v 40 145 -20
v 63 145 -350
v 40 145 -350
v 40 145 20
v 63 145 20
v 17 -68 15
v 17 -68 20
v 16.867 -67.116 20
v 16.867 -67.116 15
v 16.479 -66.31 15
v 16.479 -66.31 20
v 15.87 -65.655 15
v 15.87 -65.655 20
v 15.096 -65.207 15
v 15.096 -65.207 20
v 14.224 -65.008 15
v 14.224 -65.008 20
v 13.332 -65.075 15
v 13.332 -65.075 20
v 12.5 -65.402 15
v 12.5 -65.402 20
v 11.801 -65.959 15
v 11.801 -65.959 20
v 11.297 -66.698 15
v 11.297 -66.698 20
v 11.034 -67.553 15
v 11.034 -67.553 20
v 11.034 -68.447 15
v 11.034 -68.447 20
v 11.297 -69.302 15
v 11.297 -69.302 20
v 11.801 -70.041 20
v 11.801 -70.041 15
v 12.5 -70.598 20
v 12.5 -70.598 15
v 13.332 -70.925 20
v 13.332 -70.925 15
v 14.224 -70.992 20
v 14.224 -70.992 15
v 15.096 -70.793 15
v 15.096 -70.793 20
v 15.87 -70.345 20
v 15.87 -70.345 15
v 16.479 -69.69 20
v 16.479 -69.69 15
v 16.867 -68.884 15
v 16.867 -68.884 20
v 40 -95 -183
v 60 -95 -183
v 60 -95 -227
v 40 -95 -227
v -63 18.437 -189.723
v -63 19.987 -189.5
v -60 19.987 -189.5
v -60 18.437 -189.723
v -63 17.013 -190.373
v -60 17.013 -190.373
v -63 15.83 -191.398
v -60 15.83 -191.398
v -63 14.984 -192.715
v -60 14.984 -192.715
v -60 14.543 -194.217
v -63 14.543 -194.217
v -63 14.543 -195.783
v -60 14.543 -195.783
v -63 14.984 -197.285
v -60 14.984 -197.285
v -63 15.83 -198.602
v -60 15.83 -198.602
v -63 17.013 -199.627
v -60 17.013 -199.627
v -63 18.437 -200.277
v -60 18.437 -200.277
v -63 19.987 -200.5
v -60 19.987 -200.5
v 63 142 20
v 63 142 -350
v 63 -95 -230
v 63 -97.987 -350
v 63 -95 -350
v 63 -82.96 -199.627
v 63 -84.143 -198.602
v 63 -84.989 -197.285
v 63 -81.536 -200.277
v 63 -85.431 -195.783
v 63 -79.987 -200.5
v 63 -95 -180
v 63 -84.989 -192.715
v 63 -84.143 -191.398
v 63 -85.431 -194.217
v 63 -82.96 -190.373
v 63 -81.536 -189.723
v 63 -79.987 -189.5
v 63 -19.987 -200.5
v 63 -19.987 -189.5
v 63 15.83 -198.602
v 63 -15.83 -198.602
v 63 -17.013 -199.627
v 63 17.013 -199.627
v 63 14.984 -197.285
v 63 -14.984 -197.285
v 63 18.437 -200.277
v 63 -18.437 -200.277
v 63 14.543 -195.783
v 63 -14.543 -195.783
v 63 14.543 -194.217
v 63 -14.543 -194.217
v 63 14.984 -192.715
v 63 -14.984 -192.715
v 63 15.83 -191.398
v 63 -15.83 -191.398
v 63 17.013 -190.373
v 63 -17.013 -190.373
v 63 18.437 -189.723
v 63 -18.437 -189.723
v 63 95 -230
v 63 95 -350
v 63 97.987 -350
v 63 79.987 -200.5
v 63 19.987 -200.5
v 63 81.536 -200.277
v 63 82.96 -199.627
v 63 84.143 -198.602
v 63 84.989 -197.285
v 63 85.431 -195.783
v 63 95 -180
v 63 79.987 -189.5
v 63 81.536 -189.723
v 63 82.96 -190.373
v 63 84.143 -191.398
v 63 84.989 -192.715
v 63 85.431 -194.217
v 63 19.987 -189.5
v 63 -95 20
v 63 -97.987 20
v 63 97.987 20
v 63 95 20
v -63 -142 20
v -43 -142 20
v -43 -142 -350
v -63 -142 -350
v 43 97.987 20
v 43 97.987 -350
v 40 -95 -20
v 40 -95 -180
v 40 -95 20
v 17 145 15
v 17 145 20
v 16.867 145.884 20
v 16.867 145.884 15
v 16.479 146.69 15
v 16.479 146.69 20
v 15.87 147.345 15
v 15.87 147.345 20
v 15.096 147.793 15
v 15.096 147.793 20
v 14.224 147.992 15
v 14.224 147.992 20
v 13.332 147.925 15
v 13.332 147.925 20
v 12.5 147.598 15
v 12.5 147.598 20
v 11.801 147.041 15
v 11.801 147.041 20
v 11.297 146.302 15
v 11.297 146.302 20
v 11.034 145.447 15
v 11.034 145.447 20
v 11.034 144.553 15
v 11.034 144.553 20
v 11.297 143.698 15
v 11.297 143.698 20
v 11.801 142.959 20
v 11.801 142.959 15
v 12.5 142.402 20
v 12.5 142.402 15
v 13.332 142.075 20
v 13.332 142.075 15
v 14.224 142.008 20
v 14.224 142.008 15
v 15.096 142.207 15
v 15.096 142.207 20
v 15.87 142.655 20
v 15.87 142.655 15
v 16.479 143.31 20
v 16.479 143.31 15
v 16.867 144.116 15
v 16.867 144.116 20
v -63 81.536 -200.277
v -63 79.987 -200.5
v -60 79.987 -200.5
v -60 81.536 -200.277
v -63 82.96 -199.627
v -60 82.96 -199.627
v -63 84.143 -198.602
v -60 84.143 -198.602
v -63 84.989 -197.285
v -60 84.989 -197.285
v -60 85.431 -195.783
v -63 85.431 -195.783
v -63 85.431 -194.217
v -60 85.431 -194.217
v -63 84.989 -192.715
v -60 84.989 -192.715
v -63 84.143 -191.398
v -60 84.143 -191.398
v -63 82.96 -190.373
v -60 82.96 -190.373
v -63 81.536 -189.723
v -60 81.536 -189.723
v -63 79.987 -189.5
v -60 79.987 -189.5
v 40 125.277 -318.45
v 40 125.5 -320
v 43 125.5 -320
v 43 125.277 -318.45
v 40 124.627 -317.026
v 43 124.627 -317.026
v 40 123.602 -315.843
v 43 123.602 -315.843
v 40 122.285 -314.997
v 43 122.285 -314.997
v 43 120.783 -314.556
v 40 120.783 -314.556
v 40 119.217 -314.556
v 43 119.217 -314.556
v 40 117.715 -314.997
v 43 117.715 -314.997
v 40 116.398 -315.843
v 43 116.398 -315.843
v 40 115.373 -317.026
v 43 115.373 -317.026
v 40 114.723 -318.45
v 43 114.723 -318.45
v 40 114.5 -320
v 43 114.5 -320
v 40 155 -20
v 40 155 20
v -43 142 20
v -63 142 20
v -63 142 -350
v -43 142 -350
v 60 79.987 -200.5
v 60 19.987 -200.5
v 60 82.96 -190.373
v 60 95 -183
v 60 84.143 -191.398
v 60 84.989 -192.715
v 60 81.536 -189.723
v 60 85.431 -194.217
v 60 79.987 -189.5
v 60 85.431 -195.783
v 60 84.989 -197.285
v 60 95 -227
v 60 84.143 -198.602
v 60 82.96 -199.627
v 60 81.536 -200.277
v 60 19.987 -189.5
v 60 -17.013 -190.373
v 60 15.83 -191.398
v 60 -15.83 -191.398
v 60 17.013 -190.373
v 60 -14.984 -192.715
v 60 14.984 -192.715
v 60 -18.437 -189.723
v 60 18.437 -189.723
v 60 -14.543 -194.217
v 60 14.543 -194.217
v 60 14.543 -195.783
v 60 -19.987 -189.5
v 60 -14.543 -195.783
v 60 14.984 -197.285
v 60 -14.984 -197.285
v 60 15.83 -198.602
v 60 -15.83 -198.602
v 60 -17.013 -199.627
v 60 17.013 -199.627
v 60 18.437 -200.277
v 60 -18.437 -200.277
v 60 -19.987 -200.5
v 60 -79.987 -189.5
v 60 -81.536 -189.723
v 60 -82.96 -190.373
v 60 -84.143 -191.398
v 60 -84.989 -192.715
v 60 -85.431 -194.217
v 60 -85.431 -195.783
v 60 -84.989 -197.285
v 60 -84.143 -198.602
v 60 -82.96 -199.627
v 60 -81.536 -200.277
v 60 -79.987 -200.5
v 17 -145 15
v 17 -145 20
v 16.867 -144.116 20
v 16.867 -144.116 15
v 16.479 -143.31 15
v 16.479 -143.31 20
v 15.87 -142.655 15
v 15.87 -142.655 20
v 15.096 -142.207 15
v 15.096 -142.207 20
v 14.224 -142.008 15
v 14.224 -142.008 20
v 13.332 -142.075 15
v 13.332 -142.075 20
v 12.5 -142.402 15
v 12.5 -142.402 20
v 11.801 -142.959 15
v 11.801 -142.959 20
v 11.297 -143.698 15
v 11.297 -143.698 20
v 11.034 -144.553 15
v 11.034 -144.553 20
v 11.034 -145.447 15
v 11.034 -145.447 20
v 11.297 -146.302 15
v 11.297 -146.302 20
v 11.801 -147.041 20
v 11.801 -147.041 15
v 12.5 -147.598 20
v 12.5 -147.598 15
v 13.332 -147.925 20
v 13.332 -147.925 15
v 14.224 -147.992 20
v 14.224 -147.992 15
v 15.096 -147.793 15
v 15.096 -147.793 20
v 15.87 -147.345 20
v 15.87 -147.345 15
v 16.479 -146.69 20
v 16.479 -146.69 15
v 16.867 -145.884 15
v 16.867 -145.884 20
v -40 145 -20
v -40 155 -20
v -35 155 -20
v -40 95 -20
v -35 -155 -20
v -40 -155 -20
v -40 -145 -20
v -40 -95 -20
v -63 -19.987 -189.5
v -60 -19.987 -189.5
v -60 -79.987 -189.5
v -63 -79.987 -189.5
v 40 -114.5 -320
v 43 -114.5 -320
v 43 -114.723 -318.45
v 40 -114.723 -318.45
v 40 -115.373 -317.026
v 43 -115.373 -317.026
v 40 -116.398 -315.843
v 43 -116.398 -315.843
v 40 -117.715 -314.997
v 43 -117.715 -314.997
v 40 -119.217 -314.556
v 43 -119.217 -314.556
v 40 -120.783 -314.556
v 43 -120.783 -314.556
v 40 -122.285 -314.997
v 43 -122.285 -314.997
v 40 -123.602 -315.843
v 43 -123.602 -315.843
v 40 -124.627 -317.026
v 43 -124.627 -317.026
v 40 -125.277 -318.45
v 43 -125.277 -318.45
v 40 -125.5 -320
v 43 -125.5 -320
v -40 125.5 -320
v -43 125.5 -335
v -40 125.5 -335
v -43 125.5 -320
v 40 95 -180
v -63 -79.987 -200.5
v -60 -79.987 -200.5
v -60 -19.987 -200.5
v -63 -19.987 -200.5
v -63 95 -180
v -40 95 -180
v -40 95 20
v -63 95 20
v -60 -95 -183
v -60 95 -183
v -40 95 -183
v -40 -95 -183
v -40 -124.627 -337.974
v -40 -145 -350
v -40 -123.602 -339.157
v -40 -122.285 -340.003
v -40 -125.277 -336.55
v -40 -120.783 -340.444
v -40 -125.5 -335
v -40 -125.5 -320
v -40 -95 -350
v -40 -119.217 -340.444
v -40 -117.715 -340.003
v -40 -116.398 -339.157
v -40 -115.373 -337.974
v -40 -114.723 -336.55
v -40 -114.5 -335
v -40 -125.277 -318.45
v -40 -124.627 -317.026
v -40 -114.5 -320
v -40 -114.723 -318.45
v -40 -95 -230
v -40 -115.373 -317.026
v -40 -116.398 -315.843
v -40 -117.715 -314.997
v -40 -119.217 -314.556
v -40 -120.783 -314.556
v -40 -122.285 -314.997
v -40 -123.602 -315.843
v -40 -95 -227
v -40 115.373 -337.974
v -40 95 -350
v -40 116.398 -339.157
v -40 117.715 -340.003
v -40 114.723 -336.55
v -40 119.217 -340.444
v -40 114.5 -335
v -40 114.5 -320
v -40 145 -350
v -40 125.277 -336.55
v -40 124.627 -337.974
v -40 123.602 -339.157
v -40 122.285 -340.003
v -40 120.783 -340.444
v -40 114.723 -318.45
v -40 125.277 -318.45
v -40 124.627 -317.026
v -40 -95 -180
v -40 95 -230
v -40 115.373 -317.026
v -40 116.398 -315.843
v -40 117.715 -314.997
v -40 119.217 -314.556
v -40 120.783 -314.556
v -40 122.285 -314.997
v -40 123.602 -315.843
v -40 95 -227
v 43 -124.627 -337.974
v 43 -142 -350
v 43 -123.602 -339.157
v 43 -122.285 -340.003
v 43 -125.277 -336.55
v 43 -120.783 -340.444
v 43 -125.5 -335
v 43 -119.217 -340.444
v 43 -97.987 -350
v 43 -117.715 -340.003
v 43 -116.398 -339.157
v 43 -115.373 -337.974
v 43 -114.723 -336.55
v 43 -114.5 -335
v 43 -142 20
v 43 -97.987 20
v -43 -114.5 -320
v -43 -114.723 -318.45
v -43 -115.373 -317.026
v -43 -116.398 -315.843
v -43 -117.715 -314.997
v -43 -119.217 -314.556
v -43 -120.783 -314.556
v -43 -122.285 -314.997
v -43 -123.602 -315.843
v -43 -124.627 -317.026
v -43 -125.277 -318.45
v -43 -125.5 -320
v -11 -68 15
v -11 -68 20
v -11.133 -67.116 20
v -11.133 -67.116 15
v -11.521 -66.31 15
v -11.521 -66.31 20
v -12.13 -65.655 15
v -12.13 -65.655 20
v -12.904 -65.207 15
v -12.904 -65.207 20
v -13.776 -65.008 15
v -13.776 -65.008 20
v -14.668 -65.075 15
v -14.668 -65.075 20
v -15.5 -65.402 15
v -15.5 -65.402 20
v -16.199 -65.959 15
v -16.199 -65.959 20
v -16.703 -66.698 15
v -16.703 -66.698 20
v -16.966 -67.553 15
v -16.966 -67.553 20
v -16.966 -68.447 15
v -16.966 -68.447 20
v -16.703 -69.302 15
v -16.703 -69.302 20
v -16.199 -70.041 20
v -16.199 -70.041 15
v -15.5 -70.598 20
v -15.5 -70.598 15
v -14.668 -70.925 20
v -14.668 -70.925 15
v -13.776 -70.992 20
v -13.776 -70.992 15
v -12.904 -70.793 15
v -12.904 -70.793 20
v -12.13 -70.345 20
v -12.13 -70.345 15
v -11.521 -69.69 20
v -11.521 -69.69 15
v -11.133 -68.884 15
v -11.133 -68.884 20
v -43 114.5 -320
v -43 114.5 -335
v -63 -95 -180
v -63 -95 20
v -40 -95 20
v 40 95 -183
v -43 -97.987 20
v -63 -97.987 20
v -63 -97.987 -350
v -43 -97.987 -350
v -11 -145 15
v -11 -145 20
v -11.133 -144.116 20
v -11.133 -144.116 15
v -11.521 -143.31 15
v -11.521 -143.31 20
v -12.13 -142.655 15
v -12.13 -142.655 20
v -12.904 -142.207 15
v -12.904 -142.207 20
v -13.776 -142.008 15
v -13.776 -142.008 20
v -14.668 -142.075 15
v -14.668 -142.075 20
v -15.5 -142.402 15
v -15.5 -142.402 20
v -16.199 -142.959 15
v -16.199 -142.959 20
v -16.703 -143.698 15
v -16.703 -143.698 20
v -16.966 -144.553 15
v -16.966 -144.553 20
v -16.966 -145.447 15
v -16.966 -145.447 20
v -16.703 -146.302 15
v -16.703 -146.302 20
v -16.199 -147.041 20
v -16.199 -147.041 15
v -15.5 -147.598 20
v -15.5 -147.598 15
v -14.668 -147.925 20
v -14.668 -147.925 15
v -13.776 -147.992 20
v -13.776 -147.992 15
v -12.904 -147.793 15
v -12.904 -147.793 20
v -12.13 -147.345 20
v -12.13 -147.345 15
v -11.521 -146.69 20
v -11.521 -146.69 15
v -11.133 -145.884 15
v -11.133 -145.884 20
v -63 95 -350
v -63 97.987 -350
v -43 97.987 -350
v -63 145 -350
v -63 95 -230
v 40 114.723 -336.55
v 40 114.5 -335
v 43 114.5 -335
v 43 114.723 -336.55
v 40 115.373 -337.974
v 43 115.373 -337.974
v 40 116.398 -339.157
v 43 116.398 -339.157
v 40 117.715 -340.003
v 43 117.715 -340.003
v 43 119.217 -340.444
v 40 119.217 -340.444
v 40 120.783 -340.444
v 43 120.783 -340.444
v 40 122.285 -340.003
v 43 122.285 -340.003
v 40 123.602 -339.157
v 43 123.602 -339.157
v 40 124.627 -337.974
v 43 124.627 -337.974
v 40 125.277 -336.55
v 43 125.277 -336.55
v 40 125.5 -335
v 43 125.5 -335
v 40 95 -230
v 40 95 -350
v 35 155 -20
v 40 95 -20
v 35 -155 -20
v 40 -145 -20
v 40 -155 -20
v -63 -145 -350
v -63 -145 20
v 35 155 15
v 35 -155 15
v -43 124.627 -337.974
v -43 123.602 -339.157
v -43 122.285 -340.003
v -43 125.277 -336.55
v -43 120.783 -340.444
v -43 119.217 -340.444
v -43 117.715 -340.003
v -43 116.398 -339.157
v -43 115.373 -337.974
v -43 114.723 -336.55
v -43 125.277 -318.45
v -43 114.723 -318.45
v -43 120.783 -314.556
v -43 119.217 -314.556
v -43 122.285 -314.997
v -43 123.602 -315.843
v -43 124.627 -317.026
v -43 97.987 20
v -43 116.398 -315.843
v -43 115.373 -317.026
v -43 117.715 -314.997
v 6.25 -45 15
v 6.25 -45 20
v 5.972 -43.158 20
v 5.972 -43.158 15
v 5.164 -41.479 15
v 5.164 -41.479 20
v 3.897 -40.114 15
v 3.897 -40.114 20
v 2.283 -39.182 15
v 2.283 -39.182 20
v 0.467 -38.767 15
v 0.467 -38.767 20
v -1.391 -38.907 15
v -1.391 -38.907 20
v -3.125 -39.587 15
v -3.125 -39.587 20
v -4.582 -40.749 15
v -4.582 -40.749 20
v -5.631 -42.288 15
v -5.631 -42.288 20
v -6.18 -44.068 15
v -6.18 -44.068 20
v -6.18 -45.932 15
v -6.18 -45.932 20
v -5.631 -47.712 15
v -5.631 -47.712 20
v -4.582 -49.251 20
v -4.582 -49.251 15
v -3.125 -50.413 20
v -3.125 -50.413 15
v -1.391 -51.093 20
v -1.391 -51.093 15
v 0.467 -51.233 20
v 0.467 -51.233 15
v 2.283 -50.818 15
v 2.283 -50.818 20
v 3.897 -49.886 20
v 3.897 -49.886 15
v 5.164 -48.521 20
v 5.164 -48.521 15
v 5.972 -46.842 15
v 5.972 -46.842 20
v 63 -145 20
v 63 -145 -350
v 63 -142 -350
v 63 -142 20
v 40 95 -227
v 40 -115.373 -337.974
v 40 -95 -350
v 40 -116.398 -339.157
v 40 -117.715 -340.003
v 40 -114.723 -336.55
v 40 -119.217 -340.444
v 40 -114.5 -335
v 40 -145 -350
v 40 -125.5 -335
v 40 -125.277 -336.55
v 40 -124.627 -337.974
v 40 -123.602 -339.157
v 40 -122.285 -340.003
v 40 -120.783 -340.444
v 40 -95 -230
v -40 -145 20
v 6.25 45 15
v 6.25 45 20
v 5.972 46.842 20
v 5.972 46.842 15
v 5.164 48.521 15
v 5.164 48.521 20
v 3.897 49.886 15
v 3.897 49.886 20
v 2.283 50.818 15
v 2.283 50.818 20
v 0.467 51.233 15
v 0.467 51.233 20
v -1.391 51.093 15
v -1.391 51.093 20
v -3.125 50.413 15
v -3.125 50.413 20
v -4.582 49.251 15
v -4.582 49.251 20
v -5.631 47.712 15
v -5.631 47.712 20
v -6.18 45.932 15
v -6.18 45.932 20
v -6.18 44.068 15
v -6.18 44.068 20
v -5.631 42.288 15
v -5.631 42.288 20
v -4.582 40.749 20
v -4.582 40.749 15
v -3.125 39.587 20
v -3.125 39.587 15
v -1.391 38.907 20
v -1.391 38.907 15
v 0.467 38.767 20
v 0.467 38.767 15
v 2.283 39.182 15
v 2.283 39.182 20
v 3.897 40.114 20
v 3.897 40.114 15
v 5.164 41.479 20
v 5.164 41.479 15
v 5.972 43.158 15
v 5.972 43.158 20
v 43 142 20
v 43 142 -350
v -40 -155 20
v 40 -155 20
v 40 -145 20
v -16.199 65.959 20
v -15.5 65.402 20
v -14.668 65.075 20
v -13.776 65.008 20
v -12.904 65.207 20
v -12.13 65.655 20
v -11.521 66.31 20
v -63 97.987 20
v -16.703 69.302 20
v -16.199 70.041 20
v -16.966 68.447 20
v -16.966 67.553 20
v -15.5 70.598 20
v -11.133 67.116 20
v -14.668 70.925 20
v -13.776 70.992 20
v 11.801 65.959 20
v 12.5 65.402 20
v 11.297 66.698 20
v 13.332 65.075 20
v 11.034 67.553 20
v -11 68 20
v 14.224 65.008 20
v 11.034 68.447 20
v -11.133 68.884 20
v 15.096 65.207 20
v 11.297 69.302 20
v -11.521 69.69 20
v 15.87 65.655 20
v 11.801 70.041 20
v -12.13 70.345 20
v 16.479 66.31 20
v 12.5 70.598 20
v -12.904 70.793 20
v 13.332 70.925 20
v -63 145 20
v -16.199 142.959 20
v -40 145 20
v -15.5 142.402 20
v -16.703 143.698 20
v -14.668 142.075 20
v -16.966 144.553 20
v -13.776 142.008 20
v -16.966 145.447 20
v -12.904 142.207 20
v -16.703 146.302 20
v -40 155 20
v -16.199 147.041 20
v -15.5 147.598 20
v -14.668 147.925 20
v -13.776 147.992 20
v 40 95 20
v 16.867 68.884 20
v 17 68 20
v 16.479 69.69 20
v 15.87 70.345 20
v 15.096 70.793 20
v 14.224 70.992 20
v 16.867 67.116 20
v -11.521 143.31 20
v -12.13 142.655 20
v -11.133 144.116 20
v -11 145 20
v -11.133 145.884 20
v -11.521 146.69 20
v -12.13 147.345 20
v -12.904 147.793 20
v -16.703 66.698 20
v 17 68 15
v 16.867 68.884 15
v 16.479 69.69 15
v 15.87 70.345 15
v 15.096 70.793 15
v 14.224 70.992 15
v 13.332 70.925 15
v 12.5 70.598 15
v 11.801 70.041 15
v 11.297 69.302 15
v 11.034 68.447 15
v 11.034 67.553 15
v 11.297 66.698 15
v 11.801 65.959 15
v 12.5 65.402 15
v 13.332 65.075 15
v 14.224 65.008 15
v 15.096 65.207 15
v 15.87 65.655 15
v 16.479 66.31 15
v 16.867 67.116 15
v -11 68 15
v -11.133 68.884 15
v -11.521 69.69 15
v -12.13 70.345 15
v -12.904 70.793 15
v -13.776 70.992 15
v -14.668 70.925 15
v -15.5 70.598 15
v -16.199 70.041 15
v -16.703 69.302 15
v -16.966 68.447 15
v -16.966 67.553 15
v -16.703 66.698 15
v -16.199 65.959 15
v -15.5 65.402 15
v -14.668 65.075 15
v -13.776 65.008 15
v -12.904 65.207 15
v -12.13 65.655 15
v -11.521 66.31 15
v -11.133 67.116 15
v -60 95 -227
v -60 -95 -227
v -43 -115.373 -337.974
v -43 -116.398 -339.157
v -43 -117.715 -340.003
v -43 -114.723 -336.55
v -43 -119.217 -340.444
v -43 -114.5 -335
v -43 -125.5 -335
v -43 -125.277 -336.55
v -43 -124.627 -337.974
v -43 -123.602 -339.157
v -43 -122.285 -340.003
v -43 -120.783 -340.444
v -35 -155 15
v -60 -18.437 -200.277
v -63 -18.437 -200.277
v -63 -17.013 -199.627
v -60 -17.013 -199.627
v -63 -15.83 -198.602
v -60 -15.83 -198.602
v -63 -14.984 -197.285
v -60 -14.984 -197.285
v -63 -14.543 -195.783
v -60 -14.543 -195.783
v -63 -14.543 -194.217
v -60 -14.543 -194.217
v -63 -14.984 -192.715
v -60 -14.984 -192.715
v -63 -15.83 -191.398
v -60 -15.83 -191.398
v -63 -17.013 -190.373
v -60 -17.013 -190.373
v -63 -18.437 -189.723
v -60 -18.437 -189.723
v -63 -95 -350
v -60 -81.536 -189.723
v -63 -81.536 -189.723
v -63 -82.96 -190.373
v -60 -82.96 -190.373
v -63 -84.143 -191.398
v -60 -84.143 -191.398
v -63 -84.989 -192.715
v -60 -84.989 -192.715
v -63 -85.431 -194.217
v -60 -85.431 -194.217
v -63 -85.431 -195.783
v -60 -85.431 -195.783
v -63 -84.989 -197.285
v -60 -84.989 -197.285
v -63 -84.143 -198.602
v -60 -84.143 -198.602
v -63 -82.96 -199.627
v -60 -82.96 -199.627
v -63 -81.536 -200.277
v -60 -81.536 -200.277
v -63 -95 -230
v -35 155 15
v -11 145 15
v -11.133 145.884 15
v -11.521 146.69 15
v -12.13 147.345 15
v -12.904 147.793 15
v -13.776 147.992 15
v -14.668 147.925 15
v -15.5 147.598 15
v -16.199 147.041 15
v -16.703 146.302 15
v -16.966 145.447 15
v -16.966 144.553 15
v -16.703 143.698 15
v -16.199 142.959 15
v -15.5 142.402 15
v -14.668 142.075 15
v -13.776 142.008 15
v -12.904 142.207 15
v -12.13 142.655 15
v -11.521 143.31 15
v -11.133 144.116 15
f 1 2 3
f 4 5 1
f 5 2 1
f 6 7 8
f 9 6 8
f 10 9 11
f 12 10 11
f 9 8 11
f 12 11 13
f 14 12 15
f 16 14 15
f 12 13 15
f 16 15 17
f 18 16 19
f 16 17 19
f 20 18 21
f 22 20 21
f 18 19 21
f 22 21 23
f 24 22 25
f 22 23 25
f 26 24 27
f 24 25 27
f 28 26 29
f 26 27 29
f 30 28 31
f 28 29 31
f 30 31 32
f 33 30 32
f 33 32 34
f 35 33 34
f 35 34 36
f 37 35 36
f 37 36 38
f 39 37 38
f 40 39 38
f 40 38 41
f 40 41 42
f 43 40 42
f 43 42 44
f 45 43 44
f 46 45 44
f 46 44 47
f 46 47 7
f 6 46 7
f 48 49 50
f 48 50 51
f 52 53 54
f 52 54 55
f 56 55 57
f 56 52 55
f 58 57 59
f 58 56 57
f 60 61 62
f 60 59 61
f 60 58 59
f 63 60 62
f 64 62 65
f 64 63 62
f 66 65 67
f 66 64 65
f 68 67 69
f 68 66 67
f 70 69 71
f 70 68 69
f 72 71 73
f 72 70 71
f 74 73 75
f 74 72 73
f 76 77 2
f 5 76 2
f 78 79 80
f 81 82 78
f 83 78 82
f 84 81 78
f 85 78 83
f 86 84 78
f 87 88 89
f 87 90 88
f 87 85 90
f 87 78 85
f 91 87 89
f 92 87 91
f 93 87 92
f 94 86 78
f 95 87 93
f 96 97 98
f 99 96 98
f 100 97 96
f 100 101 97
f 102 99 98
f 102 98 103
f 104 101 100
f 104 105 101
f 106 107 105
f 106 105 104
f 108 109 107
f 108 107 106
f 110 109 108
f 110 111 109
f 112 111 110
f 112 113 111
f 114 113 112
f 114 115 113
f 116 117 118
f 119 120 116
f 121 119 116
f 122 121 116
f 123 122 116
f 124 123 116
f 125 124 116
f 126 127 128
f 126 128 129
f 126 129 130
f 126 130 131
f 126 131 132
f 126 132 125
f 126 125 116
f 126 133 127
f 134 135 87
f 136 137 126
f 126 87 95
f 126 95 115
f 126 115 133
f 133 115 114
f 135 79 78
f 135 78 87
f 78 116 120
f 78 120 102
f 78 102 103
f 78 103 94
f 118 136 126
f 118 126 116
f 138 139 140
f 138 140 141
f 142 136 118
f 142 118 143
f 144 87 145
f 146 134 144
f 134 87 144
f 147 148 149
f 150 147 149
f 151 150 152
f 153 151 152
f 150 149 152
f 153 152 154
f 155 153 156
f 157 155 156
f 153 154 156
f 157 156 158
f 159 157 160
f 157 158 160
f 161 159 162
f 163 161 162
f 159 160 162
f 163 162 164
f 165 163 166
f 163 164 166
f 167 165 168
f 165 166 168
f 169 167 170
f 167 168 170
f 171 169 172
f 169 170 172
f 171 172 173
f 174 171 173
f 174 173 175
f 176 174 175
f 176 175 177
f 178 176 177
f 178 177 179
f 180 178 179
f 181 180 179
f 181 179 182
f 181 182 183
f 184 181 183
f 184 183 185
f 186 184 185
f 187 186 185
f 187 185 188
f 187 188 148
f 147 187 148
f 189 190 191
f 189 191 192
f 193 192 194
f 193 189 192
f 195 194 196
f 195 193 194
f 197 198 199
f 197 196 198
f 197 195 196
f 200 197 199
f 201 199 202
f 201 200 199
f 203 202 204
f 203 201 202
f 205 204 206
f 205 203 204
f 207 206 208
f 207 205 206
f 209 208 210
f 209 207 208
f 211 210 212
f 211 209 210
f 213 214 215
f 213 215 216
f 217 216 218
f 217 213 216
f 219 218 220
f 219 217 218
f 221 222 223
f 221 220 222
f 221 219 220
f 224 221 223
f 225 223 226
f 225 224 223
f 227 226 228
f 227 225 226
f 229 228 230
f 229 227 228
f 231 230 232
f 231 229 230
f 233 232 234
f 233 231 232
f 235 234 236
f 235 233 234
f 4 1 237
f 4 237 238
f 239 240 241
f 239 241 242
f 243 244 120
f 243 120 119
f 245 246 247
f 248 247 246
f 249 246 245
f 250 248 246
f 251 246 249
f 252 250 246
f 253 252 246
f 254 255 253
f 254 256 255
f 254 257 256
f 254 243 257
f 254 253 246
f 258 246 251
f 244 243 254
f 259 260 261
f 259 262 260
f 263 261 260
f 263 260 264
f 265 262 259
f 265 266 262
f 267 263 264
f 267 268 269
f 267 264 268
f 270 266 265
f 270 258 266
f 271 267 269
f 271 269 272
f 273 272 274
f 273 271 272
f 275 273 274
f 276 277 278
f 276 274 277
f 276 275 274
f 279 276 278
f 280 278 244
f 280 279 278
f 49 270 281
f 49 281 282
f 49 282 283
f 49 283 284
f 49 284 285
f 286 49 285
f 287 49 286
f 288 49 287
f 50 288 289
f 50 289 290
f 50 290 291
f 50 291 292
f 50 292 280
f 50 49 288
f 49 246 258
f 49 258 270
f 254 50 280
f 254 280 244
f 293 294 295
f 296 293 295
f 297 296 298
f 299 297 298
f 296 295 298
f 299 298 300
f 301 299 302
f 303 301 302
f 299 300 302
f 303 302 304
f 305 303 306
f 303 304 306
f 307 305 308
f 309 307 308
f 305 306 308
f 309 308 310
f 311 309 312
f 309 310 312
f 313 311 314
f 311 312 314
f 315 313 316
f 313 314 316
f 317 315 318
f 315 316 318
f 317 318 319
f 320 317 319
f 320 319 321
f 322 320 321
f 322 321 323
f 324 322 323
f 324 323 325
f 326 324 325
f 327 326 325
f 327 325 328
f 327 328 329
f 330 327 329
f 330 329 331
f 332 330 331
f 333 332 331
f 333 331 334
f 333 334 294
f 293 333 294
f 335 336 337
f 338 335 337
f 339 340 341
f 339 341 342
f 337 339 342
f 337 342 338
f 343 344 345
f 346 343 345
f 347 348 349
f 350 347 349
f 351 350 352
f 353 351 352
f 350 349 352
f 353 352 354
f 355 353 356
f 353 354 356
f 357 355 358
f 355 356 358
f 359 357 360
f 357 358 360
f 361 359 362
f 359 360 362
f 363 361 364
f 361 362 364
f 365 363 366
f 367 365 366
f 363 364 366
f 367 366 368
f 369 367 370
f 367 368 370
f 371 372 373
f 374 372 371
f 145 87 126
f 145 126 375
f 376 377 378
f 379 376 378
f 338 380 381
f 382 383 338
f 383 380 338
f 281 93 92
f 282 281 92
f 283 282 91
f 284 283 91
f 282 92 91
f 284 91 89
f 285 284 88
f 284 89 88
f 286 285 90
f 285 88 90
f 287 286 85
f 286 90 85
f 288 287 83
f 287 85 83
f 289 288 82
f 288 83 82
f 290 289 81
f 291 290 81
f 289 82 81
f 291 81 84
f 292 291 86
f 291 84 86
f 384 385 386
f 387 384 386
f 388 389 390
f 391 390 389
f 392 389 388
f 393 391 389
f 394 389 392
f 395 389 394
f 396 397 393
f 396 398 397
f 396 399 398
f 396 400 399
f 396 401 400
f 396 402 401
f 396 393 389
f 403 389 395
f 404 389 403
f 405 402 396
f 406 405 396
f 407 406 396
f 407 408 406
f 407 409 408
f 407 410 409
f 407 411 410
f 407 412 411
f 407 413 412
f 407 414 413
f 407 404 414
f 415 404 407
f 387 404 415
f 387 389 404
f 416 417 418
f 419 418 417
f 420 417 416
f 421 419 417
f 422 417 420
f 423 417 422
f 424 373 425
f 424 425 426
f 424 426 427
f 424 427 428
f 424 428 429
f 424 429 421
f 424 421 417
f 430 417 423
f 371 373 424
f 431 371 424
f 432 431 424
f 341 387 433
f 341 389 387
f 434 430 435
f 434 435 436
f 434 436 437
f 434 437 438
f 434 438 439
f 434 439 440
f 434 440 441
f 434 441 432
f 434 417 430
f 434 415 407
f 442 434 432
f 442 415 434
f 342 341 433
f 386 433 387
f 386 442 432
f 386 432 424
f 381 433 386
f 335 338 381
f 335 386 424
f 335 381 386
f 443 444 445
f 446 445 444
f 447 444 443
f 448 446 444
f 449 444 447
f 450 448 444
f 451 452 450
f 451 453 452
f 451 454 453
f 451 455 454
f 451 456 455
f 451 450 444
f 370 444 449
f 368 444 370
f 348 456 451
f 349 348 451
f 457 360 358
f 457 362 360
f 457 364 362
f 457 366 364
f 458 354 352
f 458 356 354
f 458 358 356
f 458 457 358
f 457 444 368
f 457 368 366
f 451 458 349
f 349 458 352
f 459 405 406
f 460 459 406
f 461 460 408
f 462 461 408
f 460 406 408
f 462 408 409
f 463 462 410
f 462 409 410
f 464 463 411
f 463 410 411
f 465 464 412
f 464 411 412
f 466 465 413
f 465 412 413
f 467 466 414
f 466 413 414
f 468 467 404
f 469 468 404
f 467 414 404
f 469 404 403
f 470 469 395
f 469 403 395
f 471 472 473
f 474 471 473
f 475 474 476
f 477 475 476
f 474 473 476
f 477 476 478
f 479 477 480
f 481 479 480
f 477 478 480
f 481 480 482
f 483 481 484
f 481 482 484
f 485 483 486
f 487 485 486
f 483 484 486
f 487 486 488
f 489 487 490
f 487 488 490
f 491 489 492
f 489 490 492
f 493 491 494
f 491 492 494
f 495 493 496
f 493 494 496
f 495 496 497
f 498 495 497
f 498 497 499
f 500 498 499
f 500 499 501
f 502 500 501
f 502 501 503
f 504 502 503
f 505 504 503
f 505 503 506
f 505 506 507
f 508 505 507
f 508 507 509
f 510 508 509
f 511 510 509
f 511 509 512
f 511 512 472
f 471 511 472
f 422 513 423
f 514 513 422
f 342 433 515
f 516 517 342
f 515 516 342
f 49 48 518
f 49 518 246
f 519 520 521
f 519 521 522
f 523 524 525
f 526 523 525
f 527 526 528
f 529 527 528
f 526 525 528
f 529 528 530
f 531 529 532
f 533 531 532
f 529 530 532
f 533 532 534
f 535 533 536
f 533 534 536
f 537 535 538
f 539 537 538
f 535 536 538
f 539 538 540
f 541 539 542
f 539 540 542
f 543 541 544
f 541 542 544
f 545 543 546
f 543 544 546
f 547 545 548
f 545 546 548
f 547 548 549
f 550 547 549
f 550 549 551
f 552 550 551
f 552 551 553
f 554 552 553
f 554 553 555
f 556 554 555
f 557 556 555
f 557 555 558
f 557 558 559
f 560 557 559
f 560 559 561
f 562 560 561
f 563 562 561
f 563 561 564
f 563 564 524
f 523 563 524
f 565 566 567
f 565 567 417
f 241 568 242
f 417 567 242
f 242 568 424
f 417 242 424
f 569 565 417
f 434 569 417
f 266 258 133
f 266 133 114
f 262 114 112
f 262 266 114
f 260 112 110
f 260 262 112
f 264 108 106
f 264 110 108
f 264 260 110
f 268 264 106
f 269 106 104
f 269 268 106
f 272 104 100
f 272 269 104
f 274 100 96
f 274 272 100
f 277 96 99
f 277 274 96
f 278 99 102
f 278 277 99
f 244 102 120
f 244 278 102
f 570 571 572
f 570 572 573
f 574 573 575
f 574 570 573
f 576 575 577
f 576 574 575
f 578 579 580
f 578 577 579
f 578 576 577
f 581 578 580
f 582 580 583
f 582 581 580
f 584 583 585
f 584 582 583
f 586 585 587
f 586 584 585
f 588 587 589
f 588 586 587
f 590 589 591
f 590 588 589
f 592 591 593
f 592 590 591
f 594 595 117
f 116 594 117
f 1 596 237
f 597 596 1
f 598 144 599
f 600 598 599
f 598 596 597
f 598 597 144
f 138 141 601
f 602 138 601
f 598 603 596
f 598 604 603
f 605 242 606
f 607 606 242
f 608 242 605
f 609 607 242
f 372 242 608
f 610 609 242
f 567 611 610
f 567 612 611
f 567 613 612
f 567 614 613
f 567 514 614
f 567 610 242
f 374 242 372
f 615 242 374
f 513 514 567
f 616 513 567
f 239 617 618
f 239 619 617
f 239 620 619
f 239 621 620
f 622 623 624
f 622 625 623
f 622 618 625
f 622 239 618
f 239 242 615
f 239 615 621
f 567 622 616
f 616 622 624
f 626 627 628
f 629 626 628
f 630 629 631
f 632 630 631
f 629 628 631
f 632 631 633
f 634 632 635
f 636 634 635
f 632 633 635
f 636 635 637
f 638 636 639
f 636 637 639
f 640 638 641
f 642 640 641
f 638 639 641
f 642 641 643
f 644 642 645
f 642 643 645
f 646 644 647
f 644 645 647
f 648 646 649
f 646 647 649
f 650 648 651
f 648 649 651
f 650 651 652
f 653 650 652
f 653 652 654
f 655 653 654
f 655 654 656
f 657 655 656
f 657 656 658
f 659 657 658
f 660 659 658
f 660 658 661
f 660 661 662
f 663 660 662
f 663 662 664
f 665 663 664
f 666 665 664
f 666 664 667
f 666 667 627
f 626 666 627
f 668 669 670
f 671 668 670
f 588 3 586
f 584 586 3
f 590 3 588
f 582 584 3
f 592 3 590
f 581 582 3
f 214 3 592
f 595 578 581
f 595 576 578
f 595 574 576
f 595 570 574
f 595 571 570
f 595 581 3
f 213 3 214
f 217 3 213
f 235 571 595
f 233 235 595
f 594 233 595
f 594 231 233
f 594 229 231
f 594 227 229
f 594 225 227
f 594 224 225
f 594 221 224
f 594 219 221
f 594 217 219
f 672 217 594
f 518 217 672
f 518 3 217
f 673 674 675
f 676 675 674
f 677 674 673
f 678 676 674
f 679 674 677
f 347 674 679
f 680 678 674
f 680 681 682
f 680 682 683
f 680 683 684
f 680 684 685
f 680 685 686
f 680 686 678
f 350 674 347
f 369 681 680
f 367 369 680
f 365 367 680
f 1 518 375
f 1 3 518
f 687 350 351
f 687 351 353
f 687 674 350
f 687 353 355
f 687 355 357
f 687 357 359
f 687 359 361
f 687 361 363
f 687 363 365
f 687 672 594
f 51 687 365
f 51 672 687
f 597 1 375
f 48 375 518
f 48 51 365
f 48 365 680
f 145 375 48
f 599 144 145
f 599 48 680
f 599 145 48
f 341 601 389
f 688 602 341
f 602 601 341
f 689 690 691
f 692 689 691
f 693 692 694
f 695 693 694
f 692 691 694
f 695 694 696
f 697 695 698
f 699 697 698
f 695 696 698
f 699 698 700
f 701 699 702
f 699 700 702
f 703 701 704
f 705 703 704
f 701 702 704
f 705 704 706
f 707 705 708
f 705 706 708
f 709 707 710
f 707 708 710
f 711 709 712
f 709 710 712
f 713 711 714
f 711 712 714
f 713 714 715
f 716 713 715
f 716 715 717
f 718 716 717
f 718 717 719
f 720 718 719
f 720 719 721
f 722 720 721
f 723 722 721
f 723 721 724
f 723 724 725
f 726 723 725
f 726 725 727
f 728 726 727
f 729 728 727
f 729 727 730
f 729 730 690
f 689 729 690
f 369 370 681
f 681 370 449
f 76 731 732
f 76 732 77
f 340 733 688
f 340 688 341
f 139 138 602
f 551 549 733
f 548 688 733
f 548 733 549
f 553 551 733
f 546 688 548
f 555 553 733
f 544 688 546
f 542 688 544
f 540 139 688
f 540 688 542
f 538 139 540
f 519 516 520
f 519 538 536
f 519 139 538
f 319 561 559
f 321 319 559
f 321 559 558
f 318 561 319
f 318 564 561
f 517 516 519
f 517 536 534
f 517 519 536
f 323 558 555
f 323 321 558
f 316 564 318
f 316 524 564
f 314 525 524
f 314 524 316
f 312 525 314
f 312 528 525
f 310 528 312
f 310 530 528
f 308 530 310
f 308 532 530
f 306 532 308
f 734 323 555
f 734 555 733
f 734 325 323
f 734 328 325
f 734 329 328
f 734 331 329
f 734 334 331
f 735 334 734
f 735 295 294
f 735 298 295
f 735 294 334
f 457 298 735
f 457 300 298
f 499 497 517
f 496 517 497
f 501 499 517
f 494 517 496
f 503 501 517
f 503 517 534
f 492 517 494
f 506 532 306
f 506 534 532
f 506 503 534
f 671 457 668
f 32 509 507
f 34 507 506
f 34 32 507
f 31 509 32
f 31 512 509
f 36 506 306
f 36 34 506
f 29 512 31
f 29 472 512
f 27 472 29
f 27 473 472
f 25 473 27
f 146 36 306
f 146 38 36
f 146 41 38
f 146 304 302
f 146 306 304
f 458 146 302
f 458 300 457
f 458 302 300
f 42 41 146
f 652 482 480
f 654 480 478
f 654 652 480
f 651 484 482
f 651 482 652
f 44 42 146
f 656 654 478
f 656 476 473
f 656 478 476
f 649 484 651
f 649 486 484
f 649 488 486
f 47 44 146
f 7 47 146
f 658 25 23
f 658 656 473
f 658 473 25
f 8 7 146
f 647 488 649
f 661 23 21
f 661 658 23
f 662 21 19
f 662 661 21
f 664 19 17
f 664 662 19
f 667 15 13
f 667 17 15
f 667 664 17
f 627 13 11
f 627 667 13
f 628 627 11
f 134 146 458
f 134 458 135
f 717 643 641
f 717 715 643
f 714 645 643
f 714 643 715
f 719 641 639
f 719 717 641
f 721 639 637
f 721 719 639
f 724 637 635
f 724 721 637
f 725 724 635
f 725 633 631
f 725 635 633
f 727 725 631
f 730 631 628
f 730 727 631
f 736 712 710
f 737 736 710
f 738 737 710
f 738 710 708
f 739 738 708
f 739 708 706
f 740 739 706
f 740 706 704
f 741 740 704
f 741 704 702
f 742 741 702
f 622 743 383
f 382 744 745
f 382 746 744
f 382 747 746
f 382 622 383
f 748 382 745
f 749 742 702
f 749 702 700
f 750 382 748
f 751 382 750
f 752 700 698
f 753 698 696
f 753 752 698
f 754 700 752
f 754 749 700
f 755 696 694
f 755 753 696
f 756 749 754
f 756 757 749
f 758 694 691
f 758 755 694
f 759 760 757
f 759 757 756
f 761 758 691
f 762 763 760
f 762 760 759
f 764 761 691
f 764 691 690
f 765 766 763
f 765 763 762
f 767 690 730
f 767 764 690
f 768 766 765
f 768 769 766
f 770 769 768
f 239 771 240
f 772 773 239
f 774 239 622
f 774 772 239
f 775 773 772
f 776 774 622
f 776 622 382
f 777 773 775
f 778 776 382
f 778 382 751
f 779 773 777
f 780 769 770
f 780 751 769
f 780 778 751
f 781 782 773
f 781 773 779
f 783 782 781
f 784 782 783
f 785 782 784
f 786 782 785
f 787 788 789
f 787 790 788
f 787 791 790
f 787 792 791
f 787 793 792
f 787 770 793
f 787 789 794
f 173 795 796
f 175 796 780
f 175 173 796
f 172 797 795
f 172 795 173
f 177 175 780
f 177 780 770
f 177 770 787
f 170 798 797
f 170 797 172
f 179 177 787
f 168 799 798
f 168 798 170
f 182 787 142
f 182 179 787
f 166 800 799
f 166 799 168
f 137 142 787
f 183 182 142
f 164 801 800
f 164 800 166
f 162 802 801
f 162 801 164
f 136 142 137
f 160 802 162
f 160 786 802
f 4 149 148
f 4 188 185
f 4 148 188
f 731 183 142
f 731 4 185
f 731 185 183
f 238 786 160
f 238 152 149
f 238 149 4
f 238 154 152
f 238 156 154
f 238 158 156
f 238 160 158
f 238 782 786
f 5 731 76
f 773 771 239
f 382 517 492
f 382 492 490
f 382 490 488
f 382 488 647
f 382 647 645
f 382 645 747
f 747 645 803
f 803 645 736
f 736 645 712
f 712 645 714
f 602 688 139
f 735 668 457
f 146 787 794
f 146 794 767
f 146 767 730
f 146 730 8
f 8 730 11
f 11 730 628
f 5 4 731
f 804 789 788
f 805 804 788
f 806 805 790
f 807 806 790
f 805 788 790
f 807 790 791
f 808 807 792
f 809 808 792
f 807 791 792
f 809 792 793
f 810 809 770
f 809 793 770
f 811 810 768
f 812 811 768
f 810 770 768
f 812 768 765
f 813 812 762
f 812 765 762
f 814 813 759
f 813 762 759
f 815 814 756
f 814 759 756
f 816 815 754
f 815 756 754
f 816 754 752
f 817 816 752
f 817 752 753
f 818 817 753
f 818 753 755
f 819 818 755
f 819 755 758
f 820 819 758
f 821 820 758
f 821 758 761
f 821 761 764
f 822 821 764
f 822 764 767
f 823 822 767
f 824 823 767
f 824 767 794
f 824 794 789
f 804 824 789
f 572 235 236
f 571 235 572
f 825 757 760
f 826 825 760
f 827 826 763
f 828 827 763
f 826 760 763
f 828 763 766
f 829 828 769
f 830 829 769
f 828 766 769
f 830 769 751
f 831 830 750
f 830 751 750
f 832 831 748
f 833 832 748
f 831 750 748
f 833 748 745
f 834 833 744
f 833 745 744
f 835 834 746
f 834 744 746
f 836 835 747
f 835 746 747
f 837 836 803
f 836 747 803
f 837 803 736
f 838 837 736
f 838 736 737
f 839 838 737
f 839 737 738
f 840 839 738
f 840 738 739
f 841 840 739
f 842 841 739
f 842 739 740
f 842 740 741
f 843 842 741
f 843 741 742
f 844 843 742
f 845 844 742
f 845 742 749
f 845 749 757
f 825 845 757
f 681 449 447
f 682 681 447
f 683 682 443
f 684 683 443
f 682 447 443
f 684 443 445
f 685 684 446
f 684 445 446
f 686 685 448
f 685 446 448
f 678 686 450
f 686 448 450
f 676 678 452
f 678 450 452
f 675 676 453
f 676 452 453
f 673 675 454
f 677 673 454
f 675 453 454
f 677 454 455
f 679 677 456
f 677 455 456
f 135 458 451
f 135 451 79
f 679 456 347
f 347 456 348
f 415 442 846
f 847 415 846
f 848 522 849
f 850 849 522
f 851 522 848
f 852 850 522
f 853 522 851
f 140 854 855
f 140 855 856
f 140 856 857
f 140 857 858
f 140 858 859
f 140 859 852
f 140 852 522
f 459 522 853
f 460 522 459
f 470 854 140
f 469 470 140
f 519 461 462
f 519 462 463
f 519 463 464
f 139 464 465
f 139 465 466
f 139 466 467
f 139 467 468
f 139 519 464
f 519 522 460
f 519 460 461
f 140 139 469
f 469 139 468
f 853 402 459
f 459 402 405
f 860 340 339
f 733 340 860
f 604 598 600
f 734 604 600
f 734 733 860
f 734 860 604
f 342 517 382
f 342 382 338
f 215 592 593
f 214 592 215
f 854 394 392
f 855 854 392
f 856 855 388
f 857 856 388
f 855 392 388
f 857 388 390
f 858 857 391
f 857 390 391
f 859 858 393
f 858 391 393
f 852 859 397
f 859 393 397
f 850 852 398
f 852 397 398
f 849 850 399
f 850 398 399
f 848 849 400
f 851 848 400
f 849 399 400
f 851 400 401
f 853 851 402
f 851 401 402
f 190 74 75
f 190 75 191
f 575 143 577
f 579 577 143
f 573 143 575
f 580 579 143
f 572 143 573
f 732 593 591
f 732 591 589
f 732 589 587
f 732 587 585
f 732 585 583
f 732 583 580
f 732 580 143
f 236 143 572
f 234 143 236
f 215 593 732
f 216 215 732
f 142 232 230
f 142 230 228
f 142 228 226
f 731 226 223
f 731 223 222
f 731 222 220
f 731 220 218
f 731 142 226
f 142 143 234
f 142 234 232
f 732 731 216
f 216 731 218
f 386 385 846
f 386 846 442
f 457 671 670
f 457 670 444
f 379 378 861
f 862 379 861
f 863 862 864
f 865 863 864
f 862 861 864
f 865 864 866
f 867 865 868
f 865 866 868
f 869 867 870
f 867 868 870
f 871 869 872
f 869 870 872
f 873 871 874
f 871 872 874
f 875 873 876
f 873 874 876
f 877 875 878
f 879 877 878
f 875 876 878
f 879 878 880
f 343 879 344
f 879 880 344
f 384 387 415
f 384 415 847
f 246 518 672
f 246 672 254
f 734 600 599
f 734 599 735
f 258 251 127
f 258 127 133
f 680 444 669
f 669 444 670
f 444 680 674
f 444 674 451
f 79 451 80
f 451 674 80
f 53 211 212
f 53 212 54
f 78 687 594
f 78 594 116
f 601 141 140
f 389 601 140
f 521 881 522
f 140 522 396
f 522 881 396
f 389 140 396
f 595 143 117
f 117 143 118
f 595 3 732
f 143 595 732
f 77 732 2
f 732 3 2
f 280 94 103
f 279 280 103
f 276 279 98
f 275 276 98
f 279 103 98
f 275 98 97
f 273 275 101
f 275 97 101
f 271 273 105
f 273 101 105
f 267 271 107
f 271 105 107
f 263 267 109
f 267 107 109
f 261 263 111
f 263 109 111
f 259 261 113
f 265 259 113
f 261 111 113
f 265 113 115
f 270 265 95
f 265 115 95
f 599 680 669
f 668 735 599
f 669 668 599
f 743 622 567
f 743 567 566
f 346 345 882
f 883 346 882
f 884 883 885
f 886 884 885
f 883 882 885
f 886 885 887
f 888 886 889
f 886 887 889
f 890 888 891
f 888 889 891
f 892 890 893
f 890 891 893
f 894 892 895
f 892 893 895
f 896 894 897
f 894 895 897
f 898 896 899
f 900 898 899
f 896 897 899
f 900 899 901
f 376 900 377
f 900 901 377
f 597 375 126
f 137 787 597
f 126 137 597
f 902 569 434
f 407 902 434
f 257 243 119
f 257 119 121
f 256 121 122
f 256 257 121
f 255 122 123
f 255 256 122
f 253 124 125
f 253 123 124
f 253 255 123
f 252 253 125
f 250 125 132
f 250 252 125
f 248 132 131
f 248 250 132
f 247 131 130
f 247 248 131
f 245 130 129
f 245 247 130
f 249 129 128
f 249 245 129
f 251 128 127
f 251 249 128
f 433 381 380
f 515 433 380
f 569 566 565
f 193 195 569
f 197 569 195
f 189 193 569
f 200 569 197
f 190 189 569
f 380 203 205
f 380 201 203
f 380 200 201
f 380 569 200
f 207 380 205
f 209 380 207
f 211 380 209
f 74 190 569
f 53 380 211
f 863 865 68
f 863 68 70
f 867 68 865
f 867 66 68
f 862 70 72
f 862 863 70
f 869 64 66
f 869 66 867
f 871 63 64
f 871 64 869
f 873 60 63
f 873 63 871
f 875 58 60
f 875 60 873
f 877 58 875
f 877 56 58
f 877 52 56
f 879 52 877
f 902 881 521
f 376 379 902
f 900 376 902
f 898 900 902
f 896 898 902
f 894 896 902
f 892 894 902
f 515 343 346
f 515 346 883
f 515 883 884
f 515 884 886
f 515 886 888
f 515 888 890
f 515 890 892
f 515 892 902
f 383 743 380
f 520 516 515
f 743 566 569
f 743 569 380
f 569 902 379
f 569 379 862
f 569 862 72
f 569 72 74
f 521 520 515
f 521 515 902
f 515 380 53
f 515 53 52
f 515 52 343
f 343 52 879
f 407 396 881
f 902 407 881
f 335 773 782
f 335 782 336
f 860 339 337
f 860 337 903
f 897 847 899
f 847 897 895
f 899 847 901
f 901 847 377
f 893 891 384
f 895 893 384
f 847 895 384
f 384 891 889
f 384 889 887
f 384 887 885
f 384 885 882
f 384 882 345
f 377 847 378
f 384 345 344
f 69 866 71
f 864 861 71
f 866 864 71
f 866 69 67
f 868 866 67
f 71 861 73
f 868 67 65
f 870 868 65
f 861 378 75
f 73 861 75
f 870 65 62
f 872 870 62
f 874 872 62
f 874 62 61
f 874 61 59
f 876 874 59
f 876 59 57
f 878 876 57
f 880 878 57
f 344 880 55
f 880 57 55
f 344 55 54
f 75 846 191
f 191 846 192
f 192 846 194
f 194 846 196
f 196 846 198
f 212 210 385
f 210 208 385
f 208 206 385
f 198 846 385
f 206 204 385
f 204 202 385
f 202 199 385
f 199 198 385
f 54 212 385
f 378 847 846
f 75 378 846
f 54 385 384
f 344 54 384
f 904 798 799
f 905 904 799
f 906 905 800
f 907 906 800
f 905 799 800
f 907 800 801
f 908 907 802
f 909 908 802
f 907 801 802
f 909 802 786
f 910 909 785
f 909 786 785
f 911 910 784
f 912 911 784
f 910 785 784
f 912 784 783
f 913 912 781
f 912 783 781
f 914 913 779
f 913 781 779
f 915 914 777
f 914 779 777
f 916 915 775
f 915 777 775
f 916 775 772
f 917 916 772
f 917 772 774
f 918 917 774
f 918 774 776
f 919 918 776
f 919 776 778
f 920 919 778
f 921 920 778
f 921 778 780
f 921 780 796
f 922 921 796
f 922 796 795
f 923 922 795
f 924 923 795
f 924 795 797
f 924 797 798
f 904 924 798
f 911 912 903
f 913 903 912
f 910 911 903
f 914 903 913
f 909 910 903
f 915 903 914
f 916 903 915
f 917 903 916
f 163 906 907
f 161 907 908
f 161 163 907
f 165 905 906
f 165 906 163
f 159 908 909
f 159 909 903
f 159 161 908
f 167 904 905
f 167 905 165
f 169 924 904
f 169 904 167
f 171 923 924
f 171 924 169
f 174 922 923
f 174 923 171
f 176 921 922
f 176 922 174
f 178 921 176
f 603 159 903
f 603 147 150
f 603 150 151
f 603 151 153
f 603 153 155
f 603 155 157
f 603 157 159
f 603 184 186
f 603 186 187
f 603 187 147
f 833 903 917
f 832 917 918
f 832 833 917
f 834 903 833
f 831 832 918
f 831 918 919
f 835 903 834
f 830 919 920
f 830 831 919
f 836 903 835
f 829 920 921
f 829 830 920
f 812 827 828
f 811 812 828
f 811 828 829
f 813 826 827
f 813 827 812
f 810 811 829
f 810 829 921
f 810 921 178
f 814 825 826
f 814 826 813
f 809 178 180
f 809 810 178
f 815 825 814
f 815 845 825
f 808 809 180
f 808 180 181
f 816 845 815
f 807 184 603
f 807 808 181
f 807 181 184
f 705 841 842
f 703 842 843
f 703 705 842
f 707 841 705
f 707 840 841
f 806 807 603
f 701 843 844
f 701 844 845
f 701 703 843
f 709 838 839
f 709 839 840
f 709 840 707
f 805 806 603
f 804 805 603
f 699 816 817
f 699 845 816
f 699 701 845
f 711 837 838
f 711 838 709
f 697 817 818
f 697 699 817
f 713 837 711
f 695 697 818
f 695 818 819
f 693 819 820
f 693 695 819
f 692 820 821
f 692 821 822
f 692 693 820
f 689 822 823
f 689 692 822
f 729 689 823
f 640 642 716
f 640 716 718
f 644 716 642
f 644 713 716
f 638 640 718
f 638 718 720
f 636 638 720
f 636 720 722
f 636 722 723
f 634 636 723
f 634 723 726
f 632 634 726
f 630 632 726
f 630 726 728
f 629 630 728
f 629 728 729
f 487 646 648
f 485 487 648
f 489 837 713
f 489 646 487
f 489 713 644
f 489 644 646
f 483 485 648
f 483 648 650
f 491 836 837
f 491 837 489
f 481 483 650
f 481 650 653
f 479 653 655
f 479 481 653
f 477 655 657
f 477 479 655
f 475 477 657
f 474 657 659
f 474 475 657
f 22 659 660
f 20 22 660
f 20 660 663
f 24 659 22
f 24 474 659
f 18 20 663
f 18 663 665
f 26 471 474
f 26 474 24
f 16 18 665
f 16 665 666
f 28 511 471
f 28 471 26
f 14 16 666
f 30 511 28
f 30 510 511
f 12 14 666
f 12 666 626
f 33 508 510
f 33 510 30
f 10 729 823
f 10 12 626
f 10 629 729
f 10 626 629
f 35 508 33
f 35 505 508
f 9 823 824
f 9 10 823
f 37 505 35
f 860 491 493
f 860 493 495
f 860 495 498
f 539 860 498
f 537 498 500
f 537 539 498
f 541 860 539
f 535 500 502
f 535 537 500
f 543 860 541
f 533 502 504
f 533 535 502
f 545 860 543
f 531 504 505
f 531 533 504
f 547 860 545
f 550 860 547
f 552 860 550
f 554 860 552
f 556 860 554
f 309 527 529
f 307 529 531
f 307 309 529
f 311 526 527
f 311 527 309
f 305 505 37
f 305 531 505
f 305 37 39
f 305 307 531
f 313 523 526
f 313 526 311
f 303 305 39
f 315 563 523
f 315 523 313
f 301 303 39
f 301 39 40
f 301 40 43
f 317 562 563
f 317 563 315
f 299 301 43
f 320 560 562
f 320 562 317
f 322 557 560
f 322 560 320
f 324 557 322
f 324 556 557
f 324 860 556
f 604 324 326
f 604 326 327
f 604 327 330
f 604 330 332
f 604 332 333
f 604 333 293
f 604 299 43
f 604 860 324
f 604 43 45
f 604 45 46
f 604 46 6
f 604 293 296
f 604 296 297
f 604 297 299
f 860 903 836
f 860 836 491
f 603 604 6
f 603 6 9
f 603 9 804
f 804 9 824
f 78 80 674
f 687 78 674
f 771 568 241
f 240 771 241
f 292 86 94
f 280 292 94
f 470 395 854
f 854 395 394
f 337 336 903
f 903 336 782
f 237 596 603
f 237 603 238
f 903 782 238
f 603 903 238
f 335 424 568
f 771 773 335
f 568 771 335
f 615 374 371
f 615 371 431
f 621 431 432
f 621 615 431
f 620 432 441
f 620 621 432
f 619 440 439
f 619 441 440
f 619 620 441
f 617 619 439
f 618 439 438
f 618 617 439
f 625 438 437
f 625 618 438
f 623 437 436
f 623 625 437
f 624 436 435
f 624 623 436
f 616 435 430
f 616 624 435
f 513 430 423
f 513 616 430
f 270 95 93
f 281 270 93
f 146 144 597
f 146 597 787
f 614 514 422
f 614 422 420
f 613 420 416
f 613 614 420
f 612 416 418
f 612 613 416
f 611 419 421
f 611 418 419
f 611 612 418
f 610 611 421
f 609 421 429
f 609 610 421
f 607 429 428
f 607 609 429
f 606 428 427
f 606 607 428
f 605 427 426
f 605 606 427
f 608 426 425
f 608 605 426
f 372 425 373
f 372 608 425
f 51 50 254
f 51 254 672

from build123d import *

# Parameters (mm, degrees)
F1_DEPTH  = 155
F3_DEPTH  = 370
F5_DEPTH  = 50
F6_R      = 6.25
F7_DEPTH  = 25
F8_R      = 3
F9_DEPTH  = 25
F11_DEPTH = 97.5
F13_DEPTH = 75


# Not quite as in the source:
# - a feature names something its author has since deleted; it is built from what else it names


with BuildPart() as f1:
    # F0 (on Front) → F1 (new body, symmetric)
    with BuildSketch(Plane.XZ):
        Polygon((40, -20), (40, 20), (-40, 20), (-40, -20), (-35, -20), (-35, 15), (35, 15), (35, -20), align=None)
    extrude(amount=F1_DEPTH, both=True)

    # F2 (on face) → F3 (join)
    with BuildSketch(Plane.XY.offset(20)):
        Polygon((-40, 145), (-63, 145), (-63, 142), (-43, 142), (-43, 97.9865193367), (-63, 97.9865193367), (-63, 95), (-43, 95), (-40, 95), align=None)
        Polygon((-40, -145), (-40, -95), (-43, -95), (-63, -95), (-63, -97.9865193367), (-43, -97.9865193367), (-43, -142), (-63, -142), (-63, -145), align=None)
        Polygon((43, -95), (40, -95), (40, -145), (63, -145), (63, -142), (43, -142), (43, -97.9865193367), (63, -97.9865193367), (63, -95), align=None)
        Polygon((63, 145), (40, 145), (40, 95), (43, 95), (63, 95), (63, 97.9865193367), (43, 97.9865193367), (43, 142), (63, 142), align=None)
    extrude(amount=-F3_DEPTH)

    # F4 (on Right) → F5 (cut, symmetric)
    with BuildSketch(Plane.YZ):
        with BuildLine():
            Line((114.5, -320), (114.5, -335))
            ThreePointArc((114.5, -335), (120, -340.5), (125.5, -335))
            Line((125.5, -335), (125.5, -320))
            ThreePointArc((125.5, -320), (120, -314.5), (114.5, -320))
        make_face()
        with BuildLine():
            Line((-114.5, -335), (-114.5, -320))
            ThreePointArc((-114.5, -320), (-120, -314.5), (-125.5, -320))
            Line((-125.5, -320), (-125.5, -335))
            ThreePointArc((-125.5, -335), (-120, -340.5), (-114.5, -335))
        make_face()
    extrude(amount=F5_DEPTH, both=True, mode=Mode.SUBTRACT)

    # F6 (on face) → F7 (cut)
    with BuildSketch(Plane.XY.offset(20)):
        with Locations((0, 45)):
            Circle(F6_R)
        with Locations((0, -45)):
            Circle(F6_R)
    extrude(amount=-F7_DEPTH, mode=Mode.SUBTRACT)

    # F8 (on face) → F9 (cut)
    with BuildSketch(Plane.XY.offset(20)):
        with Locations((-14, 145)):
            Circle(F8_R)
        with Locations((14, 145)):
            Circle(F8_R)
        with Locations((-14, 68)):
            Circle(F8_R)
        with Locations((14, 68)):
            Circle(F8_R)
        with Locations((-14, -68)):
            Circle(F8_R)
        with Locations((14, -68)):
            Circle(F8_R)
        with Locations((-14, -145)):
            Circle(F8_R)
        with Locations((14, -145)):
            Circle(F8_R)
    extrude(amount=-F9_DEPTH, mode=Mode.SUBTRACT)

    # F10 (on Front) → F11 (join, symmetric)
    with BuildSketch(Plane.XZ):
        Polygon((-40, -180), (-63, -180), (-63, -230), (-40, -230), (-40, -227), (-60, -227), (-60, -183), (-40, -183), align=None)
        Polygon((63, -180), (40, -180), (40, -183), (60, -183), (60, -227), (40, -227), (40, -230), (63, -230), align=None)
    extrude(amount=F11_DEPTH, both=True)

    # F12 (on Right) → F13 (cut, symmetric)
    with BuildSketch(Plane.YZ):
        with BuildLine():
            Line((19.9865193367, -200.5), (79.9865193367, -200.5))
            ThreePointArc((79.9865193367, -200.5), (85.4865193367, -195), (79.9865193367, -189.5))
            Line((79.9865193367, -189.5), (19.9865193367, -189.5))
            ThreePointArc((19.9865193367, -189.5), (14.4865193367, -195), (19.9865193367, -200.5))
        make_face()
        with BuildLine():
            ThreePointArc((-79.9865193367, -189.5), (-85.4865193367, -195), (-79.9865193367, -200.5))
            Line((-79.9865193367, -200.5), (-19.9865193367, -200.5))
            ThreePointArc((-19.9865193367, -200.5), (-14.4865193367, -195), (-19.9865193367, -189.5))
            Line((-19.9865193367, -189.5), (-79.9865193367, -189.5))
        make_face()
    extrude(amount=F13_DEPTH, both=True, mode=Mode.SUBTRACT)


solid = f1.part
